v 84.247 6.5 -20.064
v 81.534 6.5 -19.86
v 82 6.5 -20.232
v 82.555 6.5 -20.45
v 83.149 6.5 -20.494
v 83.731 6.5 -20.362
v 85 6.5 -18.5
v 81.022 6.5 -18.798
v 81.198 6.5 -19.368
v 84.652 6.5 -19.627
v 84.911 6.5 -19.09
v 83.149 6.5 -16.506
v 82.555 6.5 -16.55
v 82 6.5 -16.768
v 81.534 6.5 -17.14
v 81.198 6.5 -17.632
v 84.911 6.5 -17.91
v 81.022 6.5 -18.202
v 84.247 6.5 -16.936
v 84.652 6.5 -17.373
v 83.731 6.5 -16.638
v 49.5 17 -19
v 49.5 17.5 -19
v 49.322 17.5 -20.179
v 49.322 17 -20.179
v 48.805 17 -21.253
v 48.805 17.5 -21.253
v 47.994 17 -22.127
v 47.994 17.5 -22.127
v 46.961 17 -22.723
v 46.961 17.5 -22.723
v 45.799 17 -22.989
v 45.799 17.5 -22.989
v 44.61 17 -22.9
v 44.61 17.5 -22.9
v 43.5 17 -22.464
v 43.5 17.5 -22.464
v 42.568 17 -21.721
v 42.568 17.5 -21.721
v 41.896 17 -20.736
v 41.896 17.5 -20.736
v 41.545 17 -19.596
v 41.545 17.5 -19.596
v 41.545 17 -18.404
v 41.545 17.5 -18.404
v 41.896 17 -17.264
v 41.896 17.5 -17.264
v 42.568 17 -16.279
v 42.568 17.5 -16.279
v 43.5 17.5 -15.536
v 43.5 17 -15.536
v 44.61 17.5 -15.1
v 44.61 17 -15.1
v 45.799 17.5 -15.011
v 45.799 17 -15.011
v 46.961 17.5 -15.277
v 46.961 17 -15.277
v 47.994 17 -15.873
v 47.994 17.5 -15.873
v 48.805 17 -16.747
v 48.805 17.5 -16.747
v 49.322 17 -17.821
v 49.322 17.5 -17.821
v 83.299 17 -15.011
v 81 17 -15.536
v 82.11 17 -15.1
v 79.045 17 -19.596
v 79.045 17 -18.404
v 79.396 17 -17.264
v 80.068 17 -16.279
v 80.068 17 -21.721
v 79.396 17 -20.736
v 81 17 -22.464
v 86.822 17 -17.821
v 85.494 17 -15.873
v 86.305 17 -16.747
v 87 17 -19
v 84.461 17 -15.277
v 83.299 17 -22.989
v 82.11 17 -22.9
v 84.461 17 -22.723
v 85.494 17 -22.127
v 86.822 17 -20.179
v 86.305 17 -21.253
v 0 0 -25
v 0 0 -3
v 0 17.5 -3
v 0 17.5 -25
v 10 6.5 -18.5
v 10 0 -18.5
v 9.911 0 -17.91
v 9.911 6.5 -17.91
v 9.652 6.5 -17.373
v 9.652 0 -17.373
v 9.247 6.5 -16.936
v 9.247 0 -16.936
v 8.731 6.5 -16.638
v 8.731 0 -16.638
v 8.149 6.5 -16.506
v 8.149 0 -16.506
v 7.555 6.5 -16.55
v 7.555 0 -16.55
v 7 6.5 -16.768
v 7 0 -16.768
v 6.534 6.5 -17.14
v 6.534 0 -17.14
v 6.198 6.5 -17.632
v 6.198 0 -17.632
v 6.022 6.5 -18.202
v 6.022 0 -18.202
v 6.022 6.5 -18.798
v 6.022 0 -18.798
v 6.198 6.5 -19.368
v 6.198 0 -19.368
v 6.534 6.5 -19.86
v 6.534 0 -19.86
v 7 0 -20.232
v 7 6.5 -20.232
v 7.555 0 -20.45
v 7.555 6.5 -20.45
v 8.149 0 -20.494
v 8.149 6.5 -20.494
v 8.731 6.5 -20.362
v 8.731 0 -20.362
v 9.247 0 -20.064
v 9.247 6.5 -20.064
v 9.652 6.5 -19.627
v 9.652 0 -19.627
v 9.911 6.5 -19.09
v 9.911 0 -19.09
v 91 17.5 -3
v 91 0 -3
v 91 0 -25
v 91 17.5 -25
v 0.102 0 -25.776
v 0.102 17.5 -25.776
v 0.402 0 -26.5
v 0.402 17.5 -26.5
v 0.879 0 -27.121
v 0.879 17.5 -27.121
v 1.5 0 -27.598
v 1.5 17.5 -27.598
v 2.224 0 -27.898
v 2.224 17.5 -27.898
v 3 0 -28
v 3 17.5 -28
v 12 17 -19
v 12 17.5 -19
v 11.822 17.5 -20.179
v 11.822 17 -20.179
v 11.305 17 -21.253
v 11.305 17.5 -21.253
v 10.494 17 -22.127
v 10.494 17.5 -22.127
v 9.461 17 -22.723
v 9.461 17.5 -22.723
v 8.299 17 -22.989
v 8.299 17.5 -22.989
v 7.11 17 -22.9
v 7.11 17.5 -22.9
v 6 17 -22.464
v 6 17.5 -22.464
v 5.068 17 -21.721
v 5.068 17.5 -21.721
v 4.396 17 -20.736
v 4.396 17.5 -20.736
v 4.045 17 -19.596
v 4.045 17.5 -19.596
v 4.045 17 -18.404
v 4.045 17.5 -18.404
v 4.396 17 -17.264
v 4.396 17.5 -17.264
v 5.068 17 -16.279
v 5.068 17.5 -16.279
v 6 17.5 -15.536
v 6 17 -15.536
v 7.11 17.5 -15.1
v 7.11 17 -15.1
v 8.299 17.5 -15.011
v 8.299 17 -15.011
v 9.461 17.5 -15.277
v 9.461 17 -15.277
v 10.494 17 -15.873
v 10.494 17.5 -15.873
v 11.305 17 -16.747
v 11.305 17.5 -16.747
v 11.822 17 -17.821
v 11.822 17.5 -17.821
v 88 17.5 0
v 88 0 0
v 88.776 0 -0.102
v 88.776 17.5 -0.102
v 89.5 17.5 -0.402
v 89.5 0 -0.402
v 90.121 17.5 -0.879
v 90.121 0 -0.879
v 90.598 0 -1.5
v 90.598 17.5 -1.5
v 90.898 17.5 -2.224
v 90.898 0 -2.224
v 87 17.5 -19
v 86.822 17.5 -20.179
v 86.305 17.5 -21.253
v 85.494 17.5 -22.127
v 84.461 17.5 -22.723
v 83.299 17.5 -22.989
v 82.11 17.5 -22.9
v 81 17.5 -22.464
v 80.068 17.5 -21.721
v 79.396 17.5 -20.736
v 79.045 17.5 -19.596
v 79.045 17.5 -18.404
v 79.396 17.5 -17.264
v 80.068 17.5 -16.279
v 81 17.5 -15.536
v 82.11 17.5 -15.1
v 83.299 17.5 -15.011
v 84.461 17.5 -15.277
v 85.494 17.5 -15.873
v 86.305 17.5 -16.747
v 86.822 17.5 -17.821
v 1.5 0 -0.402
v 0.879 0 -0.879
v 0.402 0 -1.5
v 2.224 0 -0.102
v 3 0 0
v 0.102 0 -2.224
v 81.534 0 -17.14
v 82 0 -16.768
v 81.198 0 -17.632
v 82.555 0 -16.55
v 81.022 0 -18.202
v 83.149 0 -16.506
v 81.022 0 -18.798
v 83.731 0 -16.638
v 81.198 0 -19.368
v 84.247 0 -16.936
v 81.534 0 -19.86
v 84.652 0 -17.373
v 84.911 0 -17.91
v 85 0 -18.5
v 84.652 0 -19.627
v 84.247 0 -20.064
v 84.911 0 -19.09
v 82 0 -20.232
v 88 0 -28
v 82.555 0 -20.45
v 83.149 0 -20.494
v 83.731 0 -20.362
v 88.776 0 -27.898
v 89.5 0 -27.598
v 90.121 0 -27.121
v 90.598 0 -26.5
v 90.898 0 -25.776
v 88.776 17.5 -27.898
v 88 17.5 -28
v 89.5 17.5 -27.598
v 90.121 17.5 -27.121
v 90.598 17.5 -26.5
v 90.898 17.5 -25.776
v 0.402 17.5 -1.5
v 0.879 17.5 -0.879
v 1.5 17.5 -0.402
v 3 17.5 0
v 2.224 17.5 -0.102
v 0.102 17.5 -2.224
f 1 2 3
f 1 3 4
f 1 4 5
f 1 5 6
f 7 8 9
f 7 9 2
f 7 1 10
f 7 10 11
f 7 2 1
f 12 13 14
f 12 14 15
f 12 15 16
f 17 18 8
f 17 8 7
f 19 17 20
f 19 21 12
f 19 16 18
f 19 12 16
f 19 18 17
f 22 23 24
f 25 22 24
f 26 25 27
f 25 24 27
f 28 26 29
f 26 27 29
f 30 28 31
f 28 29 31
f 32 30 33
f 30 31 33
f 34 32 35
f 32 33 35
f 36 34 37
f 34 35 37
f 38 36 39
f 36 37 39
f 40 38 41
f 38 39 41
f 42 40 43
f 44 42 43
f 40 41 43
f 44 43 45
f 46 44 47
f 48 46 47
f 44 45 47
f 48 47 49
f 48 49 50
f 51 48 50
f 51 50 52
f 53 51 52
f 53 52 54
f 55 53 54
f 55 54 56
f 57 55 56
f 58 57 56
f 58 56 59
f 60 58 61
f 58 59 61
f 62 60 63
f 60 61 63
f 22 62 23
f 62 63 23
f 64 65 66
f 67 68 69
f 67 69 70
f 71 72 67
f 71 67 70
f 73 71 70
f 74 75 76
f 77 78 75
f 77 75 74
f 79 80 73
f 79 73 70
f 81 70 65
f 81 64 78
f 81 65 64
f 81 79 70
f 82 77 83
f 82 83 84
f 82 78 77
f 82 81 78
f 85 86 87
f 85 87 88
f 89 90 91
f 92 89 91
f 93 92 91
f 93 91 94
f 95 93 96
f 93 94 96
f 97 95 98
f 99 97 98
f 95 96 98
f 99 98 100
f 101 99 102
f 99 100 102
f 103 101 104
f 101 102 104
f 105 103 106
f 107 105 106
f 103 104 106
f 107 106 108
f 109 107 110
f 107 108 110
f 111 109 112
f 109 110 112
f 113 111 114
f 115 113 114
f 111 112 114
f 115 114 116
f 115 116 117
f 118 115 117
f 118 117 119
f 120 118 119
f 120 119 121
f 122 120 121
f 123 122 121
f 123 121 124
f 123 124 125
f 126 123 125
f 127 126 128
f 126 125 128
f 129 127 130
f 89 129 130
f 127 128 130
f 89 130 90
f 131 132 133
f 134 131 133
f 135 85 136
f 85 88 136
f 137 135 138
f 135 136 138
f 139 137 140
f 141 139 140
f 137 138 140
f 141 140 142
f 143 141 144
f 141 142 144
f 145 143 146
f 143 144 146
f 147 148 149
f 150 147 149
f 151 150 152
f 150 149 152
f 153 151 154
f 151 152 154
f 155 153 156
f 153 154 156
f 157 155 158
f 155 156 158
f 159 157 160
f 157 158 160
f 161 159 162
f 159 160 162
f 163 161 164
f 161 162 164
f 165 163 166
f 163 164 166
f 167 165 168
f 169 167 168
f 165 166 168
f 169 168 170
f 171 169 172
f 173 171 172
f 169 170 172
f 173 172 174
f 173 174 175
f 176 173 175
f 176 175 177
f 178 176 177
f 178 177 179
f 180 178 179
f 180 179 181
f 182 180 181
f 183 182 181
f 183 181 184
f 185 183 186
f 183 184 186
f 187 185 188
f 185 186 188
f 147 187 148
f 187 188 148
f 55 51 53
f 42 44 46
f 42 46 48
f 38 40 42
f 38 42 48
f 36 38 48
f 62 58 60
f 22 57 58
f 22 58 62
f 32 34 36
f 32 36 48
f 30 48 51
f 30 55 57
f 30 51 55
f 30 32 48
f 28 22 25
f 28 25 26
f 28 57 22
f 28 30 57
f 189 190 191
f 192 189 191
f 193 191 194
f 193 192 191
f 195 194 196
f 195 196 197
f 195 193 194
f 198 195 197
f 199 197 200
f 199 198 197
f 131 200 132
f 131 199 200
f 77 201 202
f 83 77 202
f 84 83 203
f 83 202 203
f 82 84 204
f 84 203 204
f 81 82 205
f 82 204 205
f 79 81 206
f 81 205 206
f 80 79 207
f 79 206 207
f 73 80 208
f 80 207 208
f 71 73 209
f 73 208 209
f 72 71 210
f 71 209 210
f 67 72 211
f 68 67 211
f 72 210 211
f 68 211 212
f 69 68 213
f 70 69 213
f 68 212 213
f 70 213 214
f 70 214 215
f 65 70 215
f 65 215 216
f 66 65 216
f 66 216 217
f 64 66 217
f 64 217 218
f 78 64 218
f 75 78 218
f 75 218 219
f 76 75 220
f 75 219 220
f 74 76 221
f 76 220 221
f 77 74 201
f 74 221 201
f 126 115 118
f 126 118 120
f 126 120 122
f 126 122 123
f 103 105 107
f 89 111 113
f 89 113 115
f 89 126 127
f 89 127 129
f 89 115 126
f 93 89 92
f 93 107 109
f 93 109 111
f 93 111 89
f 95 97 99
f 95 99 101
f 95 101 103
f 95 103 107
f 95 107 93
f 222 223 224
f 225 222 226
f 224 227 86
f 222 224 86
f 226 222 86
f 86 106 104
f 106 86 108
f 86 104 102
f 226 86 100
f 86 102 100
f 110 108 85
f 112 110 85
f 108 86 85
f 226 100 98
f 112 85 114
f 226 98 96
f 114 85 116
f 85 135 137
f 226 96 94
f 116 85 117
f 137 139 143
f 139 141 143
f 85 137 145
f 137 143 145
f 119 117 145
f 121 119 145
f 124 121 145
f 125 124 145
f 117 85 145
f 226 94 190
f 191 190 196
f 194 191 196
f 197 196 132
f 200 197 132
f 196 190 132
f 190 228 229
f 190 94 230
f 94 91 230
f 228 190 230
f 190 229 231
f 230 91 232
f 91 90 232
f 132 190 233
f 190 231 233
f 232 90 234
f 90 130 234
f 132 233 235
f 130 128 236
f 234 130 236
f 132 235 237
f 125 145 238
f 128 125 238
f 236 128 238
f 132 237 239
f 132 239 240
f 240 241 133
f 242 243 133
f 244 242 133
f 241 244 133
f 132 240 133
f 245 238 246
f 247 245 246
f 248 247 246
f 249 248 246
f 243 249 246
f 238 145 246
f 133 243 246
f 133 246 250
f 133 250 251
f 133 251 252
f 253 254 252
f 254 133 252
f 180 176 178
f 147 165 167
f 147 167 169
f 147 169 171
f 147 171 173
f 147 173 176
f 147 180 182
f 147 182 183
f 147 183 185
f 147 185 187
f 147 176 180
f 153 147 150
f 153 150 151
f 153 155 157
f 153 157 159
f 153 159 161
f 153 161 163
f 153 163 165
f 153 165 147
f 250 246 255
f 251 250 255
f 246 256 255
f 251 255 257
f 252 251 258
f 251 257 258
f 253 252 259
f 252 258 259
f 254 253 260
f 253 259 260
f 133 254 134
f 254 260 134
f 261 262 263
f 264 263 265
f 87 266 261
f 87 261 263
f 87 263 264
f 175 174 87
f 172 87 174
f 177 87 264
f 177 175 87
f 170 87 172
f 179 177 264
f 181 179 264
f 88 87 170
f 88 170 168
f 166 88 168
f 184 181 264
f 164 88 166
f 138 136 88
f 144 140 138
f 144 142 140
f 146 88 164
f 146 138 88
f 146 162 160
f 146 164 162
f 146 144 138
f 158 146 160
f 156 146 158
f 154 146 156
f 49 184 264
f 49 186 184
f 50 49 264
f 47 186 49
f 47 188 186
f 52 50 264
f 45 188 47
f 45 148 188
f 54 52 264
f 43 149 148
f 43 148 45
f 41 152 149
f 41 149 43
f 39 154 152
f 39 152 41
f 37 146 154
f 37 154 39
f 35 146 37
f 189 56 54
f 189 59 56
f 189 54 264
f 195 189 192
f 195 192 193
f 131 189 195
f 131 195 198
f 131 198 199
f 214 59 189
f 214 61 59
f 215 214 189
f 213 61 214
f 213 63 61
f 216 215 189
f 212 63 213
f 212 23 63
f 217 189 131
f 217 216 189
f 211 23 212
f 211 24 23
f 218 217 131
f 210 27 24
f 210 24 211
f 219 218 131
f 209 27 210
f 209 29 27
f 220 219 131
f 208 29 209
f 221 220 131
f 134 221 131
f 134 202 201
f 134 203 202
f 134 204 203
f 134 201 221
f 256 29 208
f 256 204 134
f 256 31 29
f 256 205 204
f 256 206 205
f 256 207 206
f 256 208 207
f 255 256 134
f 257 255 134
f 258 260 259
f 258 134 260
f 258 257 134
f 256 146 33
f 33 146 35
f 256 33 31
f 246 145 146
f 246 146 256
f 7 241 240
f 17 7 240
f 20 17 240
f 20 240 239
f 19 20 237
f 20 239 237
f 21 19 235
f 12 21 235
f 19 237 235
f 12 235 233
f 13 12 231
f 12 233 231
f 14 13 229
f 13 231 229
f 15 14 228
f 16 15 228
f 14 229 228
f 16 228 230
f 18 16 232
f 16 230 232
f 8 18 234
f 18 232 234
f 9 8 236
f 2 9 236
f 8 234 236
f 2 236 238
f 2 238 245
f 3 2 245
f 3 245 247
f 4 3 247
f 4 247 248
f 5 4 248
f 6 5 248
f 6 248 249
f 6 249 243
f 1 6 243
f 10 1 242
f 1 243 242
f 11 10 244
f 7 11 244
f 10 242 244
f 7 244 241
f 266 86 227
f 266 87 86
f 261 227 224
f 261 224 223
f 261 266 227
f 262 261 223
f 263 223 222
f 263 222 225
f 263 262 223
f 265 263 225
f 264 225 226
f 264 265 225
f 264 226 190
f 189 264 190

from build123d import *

# Parameters (mm, degrees)
SKETCH1_W           = 91
SKETCH1_H           = 28
BOSS_EXTRUDE1_DEPTH = 17.5
SKETCH2_R           = 4
CUT_EXTRUDE1_DEPTH  = 0.5
SKETCH3_R           = 2
CUT_EXTRUDE2_DEPTH  = 6.5
FILLET1_R           = 3


with BuildPart() as part:
    # Sketch1 → Boss-Extrude1 (new body)
    with BuildSketch(Plane(origin=(0, 0, 0), x_dir=(1, 0, 0), z_dir=(0, 1, 0))):
        with Locations((45.5, 14)):
            Rectangle(SKETCH1_W, SKETCH1_H)
    extrude(amount=BOSS_EXTRUDE1_DEPTH)

    # Sketch2 → Cut-Extrude1 (cut)
    with BuildSketch(Plane(origin=(0, 17.5, 0), x_dir=(1, 0, 0), z_dir=(0, 1, 0))):
        with Locations((45.5, 19)):
            Circle(SKETCH2_R)
        with Locations((8, 19)):
            Circle(SKETCH2_R)
        with Locations((83, 19)):
            Circle(SKETCH2_R)
    extrude(amount=-CUT_EXTRUDE1_DEPTH, mode=Mode.SUBTRACT)

    # Sketch3 → Cut-Extrude2 (cut)
    with BuildSketch(Plane.XZ):
        with Locations((83, -18.5)):
            Circle(SKETCH3_R)
        with Locations((8, -18.5)):
            Circle(SKETCH3_R)
    extrude(amount=-CUT_EXTRUDE2_DEPTH, mode=Mode.SUBTRACT)

    # Fillet1
    fillet1_edges = [part.edges().sort_by_distance(p)[0] for p in [
        (0, 8.75, -28),
        (91, 8.75, -28),
        (91, 8.75, 0),
        (0, 8.75, 0),
    ]]
    fillet(fillet1_edges, radius=FILLET1_R)


solid = part.part
